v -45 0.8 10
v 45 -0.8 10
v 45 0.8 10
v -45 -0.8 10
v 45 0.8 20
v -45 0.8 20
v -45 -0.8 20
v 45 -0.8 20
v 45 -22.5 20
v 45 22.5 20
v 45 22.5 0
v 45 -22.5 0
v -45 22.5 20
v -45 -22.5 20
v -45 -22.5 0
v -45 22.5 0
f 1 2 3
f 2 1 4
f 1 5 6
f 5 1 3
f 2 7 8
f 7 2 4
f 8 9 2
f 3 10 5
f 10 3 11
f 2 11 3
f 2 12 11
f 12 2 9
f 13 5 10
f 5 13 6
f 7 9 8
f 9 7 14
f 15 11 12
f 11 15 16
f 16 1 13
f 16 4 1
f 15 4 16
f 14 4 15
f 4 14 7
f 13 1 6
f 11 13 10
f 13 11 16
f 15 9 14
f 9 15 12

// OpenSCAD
// Slide drying rack - holds 10 microscope slides standing upright on their long edge
// Print orientation: base block on the XY plane, slots open upward (+Z)

// ---------------- Parameters ----------------
block_len    = 90;    // base block length along X (mm)
block_wid    = 45;    // base block width along Y (mm)
block_h      = 20;    // base block height along Z (mm)

slot_count   = 10;    // number of slide slots
slot_len     = 77;    // slot length along X (mm)
slot_w       = 1.6;   // slot width along Y (mm)
slot_depth   = 10;    // slot depth from top face (mm)
slot_pitch   = 3.5;   // centre-to-centre slot spacing along Y (mm)

eps          = 0.5;   // overcut past faces to avoid coplanar surfaces (mm)

$fn = 64;

// ---------------- Model ----------------
difference() {
    // Solid base block, centred in X and Y, sitting on z = 0
    translate([-block_len / 2, -block_wid / 2, 0])
        cube([block_len, block_wid, block_h]);

    // Parallel slots running along X, centred as a group in X and Y
    for (i = [0 : slot_count - 1]) {
        x = (i - (slot_count - 1) / 2) * slot_pitch;
        translate([x - slot_len / 2, -slot_w / 2, block_h - slot_depth])
            cube([slot_len, slot_w, slot_depth + eps]);
    }
}
